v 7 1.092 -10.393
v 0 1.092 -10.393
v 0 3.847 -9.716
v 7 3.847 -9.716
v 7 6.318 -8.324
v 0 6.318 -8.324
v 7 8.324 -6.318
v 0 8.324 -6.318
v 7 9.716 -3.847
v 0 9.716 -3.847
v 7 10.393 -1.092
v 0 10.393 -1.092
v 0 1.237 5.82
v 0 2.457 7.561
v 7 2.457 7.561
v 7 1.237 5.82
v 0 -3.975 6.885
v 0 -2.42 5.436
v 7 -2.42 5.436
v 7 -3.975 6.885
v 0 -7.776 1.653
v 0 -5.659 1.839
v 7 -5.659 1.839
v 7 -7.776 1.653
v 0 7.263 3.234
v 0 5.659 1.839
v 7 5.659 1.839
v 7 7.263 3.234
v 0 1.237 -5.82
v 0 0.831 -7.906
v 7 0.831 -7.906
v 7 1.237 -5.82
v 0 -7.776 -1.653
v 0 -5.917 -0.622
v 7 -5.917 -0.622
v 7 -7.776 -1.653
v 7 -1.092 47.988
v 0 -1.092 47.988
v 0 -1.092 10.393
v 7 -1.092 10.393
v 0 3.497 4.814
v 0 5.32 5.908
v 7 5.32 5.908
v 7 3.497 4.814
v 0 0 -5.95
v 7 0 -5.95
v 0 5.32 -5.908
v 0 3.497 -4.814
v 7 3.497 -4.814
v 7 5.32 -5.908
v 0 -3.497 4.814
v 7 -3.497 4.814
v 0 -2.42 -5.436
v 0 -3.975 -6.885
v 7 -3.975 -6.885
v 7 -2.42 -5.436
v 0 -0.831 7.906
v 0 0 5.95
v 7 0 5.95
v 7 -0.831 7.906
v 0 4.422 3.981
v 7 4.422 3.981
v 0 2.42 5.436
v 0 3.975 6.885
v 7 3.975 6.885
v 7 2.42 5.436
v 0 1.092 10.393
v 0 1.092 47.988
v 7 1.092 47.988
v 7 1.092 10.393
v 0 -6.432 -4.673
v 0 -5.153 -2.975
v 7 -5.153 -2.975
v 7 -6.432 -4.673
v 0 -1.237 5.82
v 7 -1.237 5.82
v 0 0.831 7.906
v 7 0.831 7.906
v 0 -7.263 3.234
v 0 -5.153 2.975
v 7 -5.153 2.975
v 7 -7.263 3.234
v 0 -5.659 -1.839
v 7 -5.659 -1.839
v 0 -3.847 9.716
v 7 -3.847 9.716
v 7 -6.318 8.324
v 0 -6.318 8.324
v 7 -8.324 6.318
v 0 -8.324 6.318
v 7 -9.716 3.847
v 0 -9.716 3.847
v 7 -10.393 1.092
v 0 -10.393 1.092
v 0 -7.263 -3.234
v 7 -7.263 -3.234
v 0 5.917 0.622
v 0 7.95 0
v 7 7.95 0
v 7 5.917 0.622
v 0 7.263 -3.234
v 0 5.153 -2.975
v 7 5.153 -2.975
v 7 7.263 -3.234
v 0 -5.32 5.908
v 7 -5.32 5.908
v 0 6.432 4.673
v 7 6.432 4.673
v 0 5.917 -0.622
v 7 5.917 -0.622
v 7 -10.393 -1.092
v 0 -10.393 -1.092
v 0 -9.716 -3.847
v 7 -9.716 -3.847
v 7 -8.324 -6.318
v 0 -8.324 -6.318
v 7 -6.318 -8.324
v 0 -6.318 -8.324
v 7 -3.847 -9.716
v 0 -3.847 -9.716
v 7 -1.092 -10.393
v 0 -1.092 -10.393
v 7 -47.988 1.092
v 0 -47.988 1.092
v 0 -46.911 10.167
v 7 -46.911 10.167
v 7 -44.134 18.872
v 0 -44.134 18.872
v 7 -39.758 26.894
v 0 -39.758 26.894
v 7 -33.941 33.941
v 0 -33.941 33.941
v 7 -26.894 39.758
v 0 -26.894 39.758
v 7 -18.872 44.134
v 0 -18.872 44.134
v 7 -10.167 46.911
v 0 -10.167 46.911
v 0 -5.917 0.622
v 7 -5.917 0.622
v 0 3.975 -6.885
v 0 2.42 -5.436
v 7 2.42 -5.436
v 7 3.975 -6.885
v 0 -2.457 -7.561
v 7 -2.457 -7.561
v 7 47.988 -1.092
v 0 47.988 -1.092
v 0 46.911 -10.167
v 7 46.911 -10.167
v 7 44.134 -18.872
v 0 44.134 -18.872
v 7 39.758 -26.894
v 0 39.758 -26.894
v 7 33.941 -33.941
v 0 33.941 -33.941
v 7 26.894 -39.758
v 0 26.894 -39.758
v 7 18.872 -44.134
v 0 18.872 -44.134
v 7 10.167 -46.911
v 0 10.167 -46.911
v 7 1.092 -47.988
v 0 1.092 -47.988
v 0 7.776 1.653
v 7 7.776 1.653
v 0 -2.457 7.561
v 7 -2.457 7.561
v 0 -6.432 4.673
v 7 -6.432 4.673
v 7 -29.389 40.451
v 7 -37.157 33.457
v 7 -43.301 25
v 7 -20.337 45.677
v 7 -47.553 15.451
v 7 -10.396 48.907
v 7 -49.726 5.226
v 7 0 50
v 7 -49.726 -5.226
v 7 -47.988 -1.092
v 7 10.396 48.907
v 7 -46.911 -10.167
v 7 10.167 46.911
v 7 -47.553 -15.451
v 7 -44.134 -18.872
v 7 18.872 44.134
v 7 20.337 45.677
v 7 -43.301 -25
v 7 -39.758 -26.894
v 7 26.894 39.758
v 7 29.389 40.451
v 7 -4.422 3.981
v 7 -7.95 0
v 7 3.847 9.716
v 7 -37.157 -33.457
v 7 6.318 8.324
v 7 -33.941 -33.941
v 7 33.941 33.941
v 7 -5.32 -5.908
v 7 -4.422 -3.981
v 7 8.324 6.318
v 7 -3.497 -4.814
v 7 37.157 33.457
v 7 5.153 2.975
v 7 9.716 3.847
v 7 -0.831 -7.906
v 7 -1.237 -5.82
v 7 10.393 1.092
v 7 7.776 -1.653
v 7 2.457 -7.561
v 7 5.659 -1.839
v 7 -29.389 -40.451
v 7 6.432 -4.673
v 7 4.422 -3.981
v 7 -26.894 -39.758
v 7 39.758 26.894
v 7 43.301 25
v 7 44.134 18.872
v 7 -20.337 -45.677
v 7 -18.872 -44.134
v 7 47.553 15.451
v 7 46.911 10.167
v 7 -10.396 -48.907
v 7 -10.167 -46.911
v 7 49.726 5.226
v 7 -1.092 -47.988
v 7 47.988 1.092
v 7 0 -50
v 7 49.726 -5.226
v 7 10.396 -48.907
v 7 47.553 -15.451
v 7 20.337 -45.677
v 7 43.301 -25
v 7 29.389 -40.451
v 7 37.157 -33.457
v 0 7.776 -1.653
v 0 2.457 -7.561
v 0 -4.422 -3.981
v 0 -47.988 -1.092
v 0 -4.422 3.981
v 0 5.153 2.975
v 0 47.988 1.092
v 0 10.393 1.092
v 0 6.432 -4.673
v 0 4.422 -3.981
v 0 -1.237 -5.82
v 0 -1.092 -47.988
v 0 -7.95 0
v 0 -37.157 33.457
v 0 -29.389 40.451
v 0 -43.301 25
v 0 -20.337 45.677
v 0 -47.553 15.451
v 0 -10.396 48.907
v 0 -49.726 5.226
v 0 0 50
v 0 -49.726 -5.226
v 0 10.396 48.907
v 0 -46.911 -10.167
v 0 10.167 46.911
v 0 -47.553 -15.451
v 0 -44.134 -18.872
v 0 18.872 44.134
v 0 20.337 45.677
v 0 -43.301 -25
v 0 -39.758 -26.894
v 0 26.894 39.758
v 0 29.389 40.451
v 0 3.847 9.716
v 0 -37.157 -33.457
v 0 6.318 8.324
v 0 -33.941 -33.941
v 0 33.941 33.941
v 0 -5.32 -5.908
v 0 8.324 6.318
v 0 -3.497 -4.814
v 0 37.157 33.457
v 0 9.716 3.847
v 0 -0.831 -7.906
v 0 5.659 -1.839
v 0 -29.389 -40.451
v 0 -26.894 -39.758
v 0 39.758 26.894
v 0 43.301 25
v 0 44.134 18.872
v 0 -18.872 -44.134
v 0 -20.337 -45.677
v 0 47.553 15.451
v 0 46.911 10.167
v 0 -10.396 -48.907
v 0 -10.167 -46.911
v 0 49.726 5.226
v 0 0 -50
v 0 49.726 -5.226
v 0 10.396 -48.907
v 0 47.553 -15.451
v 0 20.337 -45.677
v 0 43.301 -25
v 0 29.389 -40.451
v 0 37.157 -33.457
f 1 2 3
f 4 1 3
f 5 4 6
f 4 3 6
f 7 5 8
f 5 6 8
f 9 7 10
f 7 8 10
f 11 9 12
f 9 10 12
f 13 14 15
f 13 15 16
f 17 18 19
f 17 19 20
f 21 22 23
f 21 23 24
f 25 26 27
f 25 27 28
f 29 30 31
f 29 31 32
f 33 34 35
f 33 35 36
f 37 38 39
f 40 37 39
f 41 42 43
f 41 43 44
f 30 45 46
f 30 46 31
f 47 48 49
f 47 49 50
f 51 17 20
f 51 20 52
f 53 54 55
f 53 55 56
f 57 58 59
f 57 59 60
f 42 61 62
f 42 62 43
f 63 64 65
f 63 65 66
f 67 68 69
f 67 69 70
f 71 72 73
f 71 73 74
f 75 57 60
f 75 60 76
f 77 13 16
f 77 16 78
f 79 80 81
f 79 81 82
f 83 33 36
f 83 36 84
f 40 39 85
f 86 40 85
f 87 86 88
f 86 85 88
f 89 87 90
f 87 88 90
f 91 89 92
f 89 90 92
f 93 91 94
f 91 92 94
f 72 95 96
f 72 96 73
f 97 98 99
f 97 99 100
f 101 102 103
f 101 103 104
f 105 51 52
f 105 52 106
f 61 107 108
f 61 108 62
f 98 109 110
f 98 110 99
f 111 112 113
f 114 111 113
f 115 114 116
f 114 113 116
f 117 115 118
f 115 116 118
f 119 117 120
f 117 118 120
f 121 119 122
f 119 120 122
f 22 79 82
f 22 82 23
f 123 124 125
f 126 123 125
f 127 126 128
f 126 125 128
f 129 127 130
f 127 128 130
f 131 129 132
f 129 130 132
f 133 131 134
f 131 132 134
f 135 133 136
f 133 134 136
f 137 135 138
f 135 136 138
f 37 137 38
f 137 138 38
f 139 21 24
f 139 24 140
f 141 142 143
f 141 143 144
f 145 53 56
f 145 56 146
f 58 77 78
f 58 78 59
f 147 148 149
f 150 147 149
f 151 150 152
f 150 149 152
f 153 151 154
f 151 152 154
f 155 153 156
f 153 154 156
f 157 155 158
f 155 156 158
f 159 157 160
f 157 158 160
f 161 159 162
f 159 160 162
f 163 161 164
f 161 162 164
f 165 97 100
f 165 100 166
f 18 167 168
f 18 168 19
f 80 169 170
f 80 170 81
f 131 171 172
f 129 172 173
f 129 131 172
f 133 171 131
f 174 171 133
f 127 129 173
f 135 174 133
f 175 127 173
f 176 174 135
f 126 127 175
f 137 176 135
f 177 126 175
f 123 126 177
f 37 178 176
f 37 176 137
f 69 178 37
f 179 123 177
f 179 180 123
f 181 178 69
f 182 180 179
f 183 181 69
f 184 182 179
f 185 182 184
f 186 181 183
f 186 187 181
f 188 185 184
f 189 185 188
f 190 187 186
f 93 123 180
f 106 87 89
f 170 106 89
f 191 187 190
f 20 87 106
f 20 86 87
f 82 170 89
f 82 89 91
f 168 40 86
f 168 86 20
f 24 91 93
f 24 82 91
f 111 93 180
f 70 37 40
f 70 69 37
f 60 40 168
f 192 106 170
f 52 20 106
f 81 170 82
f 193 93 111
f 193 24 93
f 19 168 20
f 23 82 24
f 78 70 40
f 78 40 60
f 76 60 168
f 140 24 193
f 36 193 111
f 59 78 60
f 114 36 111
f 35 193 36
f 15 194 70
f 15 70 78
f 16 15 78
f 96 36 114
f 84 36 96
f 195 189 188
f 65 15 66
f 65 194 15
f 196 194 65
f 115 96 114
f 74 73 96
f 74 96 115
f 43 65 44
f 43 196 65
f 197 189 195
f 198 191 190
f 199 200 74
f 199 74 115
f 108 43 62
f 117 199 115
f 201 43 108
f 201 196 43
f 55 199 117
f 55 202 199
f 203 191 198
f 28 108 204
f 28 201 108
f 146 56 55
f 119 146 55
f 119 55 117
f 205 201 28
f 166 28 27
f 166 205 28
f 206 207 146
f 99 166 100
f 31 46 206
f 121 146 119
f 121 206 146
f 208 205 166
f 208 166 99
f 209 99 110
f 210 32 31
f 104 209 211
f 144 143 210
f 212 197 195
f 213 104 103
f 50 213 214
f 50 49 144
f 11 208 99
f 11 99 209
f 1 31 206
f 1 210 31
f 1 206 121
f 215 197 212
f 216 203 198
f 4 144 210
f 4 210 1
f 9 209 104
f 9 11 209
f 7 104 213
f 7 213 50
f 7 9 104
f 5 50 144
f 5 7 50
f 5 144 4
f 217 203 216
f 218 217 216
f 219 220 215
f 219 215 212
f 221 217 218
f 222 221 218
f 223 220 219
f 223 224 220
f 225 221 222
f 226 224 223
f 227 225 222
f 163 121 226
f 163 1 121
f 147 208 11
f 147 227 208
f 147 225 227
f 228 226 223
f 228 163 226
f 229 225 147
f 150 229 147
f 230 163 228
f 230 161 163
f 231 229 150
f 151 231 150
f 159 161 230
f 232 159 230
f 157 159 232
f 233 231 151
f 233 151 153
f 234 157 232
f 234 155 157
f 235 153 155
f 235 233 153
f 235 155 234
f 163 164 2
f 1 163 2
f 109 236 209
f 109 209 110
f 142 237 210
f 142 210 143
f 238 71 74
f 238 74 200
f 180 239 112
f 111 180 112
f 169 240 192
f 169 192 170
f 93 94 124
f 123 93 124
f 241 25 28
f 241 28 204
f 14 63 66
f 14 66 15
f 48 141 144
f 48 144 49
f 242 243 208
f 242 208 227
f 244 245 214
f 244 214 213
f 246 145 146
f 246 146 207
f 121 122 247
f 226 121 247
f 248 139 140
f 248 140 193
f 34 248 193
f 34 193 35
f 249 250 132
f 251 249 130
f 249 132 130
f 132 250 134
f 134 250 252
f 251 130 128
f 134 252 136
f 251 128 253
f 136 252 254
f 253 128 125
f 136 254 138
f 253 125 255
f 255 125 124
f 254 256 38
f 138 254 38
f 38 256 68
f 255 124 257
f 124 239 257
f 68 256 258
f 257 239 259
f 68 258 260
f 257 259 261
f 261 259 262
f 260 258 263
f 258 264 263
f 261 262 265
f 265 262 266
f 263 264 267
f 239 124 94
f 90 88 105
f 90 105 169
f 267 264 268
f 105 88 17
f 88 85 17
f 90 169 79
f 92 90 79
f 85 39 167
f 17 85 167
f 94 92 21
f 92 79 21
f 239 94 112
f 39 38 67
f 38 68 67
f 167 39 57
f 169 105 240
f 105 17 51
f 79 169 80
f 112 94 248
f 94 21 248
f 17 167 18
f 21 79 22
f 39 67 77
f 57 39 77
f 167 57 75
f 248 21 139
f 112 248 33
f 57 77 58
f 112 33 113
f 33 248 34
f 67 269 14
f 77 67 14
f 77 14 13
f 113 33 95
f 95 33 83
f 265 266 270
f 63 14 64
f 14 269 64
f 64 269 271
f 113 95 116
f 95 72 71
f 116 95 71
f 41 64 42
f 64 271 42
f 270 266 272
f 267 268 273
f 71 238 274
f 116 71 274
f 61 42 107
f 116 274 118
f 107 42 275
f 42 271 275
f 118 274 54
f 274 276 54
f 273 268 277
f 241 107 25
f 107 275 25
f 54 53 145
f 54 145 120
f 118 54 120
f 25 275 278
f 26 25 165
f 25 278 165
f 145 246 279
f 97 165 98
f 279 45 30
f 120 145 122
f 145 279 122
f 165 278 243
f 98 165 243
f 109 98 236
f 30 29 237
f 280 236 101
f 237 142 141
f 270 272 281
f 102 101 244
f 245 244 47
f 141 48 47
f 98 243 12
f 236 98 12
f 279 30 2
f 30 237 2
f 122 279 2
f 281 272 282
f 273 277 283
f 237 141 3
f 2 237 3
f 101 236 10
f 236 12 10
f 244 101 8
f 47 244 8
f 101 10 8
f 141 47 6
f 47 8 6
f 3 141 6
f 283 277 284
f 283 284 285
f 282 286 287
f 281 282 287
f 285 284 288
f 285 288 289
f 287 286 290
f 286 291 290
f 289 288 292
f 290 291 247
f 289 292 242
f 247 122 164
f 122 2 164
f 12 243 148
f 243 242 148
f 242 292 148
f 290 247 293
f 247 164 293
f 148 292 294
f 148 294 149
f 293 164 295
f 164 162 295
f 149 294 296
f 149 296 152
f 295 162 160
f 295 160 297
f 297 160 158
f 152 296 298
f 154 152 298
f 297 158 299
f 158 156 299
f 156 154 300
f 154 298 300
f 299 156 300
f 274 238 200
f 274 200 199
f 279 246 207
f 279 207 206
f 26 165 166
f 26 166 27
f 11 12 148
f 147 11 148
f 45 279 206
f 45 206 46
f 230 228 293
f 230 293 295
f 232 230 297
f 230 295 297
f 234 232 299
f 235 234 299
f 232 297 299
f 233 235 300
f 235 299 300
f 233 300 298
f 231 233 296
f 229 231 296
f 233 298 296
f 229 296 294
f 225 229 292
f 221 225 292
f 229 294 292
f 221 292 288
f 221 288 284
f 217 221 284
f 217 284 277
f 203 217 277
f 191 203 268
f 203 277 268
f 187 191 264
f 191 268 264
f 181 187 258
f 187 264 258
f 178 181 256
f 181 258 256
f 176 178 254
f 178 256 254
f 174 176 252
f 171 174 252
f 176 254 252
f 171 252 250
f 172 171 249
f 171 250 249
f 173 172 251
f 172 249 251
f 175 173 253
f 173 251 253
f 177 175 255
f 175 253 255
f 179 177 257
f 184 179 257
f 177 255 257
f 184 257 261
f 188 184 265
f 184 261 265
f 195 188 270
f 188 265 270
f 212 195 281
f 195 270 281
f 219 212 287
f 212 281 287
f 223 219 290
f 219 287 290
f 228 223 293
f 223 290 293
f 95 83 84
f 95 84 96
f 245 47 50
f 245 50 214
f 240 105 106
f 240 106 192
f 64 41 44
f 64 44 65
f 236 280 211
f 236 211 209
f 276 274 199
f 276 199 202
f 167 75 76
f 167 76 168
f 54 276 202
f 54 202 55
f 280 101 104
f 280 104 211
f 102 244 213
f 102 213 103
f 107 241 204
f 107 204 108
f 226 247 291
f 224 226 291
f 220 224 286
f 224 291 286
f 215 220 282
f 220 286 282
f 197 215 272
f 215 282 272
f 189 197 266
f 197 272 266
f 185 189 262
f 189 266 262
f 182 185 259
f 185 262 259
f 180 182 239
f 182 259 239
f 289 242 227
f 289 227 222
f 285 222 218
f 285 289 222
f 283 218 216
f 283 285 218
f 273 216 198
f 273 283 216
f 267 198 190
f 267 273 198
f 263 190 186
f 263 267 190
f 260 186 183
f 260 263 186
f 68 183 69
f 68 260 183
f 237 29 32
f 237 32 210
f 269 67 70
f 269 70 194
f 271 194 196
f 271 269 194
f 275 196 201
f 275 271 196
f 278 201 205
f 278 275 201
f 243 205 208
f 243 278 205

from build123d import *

# Parameters (mm, degrees)
SKETCH3_R           = 50
BOSS_EXTRUDE2_DEPTH = 7


with BuildPart() as part:
    # Sketch3 → Boss-Extrude2 (new body)
    with BuildSketch(Plane(origin=(0, 0, 0), x_dir=(0, 0, -1), z_dir=(1, 0, 0))):
        Circle(SKETCH3_R)
        Polygon((0, 7.95), (-0.621944356, 5.917405277), (-1.652897942, 7.776273426), (-1.838651117, 5.658786272), (-3.233556312, 7.262686388), (-2.975, 5.152851153), (-4.672892756, 6.431685105), (-3.981327108, 4.421711712), (-5.908001363, 5.319588321), (-4.813651117, 3.497322251), (-6.88490196, 3.975), (-5.435595473, 2.420083026), (-7.560899305, 2.456685105), (-5.819978224, 1.23707456), (-7.906449068, 0.831001283), (-5.95, 0), (-7.906449068, -0.831001283), (-5.819978224, -1.23707456), (-7.560899305, -2.456685105), (-5.435595473, -2.420083026), (-6.88490196, -3.975), (-4.813651117, -3.497322251), (-5.908001363, -5.319588321), (-3.981327108, -4.421711712), (-4.672892756, -6.431685105), (-2.975, -5.152851153), (-3.233556312, -7.262686388), (-1.838651117, -5.658786272), (-1.652897942, -7.776273426), (-0.621944356, -5.917405277), (0, -7.95), (0.621944356, -5.917405277), (1.652897942, -7.776273426), (1.838651117, -5.658786272), (3.233556312, -7.262686388), (2.975, -5.152851153), (4.672892756, -6.431685105), (3.981327108, -4.421711712), (5.908001363, -5.319588321), (4.813651117, -3.497322251), (6.88490196, -3.975), (5.435595473, -2.420083026), (7.560899305, -2.456685105), (5.819978224, -1.23707456), (7.906449068, -0.831001283), (5.95, 0), (7.906449068, 0.831001283), (5.819978224, 1.23707456), (7.560899305, 2.456685105), (5.435595473, 2.420083026), (6.88490196, 3.975), (4.813651117, 3.497322251), (5.908001363, 5.319588321), (3.981327108, 4.421711712), (4.672892756, 6.431685105), (2.975, 5.152851153), (3.233556312, 7.262686388), (1.838651117, 5.658786272), (1.652897942, 7.776273426), (0.621944356, 5.917405277), align=None, mode=Mode.SUBTRACT)
        with BuildLine():
            Line((-1.092322441, 10.392753807), (-1.092322441, 47.987569554))
            ThreePointArc((-1.092322441, 47.987569554), (-33.941125497, 33.941125497), (-47.987569554, 1.092322441))
            Line((-47.987569554, 1.092322441), (-10.392753807, 1.092322441))
            ThreePointArc((-10.392753807, 1.092322441), (-7.389265863, 7.389265863), (-1.092322441, 10.392753807))
        make_face(mode=Mode.SUBTRACT)
        with BuildLine():
            Line((1.092322441, 10.392753807), (1.092322441, 47.987569554))
            ThreePointArc((1.092322441, 47.987569554), (33.941125497, 33.941125497), (47.987569554, 1.092322441))
            Line((47.987569554, 1.092322441), (10.392753807, 1.092322441))
            ThreePointArc((10.392753807, 1.092322441), (7.389265863, 7.389265863), (1.092322441, 10.392753807))
        make_face(mode=Mode.SUBTRACT)
        with BuildLine():
            Line((10.392753807, -1.092322441), (47.987569554, -1.092322441))
            ThreePointArc((47.987569554, -1.092322441), (33.941125497, -33.941125497), (1.092322441, -47.987569554))
            Line((1.092322441, -47.987569554), (1.092322441, -10.392753807))
            ThreePointArc((1.092322441, -10.392753807), (7.389265863, -7.389265863), (10.392753807, -1.092322441))
        make_face(mode=Mode.SUBTRACT)
        with BuildLine():
            Line((-1.092322441, -10.392753807), (-1.092322441, -47.987569554))
            ThreePointArc((-1.092322441, -47.987569554), (-33.941125497, -33.941125497), (-47.987569554, -1.092322441))
            Line((-47.987569554, -1.092322441), (-10.392753807, -1.092322441))
            ThreePointArc((-10.392753807, -1.092322441), (-7.389265863, -7.389265863), (-1.092322441, -10.392753807))
        make_face(mode=Mode.SUBTRACT)
    extrude(amount=BOSS_EXTRUDE2_DEPTH)


solid = part.part
